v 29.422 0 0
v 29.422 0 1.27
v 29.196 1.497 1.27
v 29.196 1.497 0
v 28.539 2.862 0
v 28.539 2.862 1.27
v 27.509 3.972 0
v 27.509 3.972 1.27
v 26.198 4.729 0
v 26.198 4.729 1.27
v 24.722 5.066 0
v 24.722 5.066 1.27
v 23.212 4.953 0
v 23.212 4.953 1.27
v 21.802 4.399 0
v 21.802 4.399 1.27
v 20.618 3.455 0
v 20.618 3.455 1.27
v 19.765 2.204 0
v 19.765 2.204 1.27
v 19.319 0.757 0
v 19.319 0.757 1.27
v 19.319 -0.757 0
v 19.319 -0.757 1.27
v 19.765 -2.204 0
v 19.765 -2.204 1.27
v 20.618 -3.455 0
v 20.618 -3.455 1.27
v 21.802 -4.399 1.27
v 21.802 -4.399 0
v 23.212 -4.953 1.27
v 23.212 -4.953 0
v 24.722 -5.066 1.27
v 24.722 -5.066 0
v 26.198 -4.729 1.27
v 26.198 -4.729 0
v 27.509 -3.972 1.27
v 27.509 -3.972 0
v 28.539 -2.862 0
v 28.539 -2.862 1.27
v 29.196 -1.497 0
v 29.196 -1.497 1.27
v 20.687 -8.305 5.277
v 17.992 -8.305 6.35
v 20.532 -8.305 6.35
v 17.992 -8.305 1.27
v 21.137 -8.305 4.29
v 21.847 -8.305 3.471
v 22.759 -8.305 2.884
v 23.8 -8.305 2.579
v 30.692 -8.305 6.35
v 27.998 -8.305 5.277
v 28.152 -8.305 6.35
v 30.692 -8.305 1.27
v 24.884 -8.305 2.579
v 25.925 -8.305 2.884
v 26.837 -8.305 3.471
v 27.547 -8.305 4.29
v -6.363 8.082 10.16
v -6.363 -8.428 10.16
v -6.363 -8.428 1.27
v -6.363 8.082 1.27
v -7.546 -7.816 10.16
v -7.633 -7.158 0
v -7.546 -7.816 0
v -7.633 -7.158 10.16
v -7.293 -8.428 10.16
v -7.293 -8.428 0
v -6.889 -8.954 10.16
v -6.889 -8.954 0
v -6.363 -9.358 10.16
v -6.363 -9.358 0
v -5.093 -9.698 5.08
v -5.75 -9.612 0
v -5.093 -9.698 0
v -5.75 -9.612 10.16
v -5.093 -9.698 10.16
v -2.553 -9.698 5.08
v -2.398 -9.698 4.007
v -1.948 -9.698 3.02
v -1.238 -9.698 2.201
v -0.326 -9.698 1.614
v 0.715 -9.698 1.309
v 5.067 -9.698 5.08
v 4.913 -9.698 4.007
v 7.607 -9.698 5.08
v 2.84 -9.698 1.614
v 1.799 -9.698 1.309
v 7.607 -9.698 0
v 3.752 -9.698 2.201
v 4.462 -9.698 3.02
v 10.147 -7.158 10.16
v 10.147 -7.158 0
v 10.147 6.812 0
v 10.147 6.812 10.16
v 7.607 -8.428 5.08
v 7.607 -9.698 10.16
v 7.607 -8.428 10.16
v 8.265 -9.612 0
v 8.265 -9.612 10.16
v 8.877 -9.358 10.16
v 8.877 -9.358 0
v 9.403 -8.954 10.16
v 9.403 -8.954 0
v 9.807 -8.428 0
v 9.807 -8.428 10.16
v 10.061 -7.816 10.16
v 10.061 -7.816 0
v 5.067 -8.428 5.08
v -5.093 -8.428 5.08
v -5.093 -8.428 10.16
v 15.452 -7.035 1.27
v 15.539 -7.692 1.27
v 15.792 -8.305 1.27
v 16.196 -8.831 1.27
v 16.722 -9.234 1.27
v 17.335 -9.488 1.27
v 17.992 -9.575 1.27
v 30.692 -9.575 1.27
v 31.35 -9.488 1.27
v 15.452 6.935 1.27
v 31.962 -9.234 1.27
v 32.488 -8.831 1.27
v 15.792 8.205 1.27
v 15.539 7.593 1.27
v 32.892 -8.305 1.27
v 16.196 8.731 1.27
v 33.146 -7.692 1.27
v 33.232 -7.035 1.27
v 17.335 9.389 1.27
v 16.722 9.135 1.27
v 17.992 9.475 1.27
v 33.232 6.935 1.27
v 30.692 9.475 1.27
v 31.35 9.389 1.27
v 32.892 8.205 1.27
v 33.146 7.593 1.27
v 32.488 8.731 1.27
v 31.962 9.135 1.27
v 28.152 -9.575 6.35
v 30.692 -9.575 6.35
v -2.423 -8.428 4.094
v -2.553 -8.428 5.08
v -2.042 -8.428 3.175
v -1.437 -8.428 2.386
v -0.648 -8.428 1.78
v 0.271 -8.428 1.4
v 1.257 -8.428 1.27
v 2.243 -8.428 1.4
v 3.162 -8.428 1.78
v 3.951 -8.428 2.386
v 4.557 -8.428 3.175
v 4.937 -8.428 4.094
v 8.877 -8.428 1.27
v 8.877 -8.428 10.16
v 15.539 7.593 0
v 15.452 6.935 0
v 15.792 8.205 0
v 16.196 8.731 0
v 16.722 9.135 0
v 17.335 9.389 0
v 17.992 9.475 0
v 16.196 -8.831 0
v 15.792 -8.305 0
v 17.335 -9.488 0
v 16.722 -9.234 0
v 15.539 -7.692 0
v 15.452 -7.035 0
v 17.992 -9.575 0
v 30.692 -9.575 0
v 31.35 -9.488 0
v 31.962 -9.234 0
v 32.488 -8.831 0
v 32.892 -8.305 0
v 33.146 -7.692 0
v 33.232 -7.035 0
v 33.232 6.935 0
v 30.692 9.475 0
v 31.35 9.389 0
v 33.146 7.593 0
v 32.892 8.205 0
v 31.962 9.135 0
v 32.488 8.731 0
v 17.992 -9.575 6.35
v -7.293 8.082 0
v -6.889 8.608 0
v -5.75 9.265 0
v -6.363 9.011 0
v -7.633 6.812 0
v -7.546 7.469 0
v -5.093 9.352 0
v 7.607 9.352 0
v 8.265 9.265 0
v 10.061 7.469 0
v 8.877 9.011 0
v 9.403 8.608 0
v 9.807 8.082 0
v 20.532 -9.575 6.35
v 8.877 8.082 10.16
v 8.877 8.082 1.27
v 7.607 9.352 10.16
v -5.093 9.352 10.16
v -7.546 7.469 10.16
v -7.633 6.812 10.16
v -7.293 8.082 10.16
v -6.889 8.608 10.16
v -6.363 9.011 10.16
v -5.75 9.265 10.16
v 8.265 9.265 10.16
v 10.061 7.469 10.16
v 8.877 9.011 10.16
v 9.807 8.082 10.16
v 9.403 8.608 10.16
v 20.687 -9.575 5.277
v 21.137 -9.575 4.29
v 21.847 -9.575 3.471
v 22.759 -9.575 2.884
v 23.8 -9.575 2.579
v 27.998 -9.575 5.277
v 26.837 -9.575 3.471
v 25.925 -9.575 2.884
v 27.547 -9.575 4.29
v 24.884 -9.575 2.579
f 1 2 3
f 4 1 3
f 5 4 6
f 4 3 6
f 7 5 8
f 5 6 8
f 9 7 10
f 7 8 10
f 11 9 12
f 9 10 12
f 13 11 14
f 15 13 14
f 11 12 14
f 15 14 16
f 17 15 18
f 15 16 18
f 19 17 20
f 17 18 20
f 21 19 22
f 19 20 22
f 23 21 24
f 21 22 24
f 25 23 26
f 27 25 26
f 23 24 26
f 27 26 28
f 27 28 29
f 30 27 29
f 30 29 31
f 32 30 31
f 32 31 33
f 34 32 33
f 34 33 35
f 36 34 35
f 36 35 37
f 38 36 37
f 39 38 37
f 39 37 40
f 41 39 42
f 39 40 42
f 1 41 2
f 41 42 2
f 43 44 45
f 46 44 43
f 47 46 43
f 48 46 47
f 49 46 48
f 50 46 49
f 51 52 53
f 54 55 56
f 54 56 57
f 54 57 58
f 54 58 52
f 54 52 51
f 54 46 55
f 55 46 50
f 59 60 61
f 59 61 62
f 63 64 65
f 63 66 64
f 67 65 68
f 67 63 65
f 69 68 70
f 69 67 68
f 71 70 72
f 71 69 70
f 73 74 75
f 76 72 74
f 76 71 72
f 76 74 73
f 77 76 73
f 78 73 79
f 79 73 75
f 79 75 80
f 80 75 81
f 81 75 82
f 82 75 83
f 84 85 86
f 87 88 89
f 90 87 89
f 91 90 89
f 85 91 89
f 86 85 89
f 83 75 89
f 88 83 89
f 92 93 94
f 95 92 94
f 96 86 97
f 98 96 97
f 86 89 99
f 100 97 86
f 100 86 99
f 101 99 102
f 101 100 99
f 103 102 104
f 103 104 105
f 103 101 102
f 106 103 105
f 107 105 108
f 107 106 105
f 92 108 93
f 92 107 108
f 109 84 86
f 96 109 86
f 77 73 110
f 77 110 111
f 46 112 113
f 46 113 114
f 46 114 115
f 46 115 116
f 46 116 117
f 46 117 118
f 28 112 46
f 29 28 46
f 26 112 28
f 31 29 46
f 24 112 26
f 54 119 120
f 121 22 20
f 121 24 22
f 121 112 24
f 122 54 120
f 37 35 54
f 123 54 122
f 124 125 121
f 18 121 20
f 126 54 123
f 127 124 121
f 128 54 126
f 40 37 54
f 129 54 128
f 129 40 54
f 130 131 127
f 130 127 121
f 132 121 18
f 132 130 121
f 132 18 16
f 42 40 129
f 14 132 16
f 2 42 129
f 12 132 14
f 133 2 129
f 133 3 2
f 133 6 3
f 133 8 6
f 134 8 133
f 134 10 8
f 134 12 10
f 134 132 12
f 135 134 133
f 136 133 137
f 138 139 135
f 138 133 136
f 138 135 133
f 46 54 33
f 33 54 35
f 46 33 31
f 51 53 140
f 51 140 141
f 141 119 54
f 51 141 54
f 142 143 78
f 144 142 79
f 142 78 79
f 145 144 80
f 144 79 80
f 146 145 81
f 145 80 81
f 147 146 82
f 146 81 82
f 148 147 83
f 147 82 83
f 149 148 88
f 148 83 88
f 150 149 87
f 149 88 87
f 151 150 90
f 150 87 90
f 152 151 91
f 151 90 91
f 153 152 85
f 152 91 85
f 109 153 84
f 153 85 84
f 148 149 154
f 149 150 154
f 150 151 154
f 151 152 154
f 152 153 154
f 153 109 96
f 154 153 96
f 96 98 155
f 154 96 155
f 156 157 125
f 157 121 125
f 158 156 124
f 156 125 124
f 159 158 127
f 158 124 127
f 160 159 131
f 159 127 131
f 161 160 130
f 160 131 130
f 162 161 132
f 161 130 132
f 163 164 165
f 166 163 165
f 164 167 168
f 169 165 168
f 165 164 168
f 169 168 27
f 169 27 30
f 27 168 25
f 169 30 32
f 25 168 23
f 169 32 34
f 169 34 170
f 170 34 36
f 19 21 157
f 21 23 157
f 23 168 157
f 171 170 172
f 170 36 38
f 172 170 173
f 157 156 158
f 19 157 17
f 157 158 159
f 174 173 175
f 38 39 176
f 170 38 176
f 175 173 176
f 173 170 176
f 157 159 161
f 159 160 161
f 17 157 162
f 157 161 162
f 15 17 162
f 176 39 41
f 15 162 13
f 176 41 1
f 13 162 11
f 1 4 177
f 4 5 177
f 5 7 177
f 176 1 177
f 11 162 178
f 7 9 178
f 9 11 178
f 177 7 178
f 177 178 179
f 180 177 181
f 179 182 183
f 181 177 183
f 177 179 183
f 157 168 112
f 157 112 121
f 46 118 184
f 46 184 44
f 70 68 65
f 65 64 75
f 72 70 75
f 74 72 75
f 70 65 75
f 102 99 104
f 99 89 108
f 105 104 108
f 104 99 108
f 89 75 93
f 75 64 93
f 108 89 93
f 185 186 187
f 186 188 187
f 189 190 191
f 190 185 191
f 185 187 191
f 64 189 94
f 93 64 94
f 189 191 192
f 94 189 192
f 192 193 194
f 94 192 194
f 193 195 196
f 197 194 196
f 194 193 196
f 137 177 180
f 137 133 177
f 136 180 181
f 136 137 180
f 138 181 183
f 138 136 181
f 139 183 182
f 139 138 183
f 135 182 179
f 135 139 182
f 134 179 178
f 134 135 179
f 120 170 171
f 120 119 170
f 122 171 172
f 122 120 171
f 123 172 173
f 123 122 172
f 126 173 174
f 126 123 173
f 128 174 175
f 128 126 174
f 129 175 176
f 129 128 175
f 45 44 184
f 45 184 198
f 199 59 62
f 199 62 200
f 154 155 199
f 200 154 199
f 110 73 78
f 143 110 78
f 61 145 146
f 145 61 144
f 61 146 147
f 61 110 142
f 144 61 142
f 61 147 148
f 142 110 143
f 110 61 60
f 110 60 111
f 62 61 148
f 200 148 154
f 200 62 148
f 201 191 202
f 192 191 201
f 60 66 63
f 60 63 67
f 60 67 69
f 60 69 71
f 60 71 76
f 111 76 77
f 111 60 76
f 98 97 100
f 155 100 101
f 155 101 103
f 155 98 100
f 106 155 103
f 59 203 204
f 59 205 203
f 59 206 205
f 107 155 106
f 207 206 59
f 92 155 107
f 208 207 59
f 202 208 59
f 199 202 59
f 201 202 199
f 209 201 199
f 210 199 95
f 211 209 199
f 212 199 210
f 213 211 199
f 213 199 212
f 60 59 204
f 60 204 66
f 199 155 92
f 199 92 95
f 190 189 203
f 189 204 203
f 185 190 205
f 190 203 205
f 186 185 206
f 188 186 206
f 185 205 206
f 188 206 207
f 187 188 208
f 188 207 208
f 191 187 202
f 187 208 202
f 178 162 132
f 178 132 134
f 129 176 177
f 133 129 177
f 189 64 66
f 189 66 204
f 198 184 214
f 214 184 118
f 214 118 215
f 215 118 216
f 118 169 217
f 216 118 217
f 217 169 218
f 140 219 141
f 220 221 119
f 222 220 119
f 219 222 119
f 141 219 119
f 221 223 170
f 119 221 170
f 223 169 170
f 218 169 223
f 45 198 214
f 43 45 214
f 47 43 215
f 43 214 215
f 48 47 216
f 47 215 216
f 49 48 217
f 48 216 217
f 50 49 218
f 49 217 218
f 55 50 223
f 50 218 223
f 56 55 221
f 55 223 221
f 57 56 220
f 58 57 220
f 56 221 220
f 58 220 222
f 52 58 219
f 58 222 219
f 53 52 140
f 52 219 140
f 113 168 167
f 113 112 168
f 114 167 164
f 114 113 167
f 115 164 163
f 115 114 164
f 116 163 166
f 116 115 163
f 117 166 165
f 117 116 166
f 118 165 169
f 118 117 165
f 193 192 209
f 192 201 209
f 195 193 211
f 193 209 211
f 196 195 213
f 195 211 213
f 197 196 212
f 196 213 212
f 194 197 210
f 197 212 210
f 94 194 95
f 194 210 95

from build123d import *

# Parameters (mm, degrees)
F0_W      = 17.78
F0_H      = 19.05
F1_DEPTH  = 10.16
F2_W      = 15.24
F2_H      = 16.51
F3_DEPTH  = 8.89
F4_R      = 2.54
F5_W      = 2.54
F5_H      = 5.08
F6_DEPTH  = 1.27
F7_W      = 17.78
F7_H      = 19.05
F8_DEPTH  = 1.27
F9_R      = 2.54
F10_W     = 12.7
F10_H     = 1.27
F11_DEPTH = 5.08
F12_R     = 3.81
F13_DEPTH = 1.27
F14_R     = 5.08
F15_DEPTH = 1.27


# Not quite as in the source:
# - a feature names something its author has since deleted; it is built from what else it names


with BuildPart() as f1:
    # F0 (on Top) → F1 (new body)
    with BuildSketch(Plane.XY):
        with Locations((1.2571994369, -0.1732670812)):
            Rectangle(F0_W, F0_H)
    extrude(amount=F1_DEPTH)

    # F2 (on face) → F3 (cut)
    with BuildSketch(Plane.XY.offset(10.16)):
        with Locations((1.2571994369, -0.1732670812)):
            Rectangle(F2_W, F2_H)
    extrude(amount=-F3_DEPTH, mode=Mode.SUBTRACT)

    # F4
    f4_edges = [f1.edges().sort_by_distance(p)[0] for p in [
        (10.147199, 9.351733, 5.08),
        (-7.632801, 9.351733, 5.08),
        (-7.632801, -9.698267, 5.08),
        (10.147199, -9.698267, 5.08),
    ]]
    fillet(f4_edges, radius=F4_R)

    # F5 (on face) → F6 (cut)
    with BuildSketch(Plane.XZ.offset(9.6982670812)):
        with BuildLine():
            ThreePointArc((-2.5528005631, 5.08), (1.2571994369, 1.27), (5.0671994369, 5.08))
            ThreePointArc((5.0671994369, 5.08), (1.2571994369, 8.89), (-2.5528005631, 5.08))
        make_face()
        with Locations((-3.8228005631, 7.62)):
            Rectangle(F5_W, F5_H)
        with Locations((6.3371994369, 7.62)):
            Rectangle(F5_W, F5_H)
        with BuildLine():
            ThreePointArc((-2.5528005631, 5.08), (1.2571994369, 8.89), (5.0671994369, 5.08))
            Line((5.0671994369, 5.08), (5.0671994369, 10.16))
            Line((5.0671994369, 10.16), (-2.5528005631, 10.16))
            Line((-2.5528005631, 10.16), (-2.5528005631, 5.08))
        make_face()
    extrude(amount=-F6_DEPTH, mode=Mode.SUBTRACT)


with BuildPart() as f8:
    # F7 (on Top) → F8 (new body)
    with BuildSketch(Plane.XY):
        with Locations((24.3421698132, -0.0496563748)):
            Rectangle(F7_W, F7_H)
    extrude(amount=F8_DEPTH)

    # F9
    f9_edges = [f8.edges().sort_by_distance(p)[0] for p in [
        (15.45217, -9.574656, 0.635),
        (33.23217, -9.574656, 0.635),
        (33.23217, 9.475344, 0.635),
        (15.45217, 9.475344, 0.635),
    ]]
    fillet(f9_edges, radius=F9_R)

    # F10 (on face) → F11 (join)
    with BuildSketch(Plane.XY.offset(1.27)):
        with Locations((24.3421698132, -8.9396563748)):
            Rectangle(F10_W, F10_H)
    extrude(amount=F11_DEPTH)

    # F12 (on face) → F13 (cut)
    with BuildSketch(Plane.XZ.offset(9.5746563748)):
        with Locations((24.3421698132, 6.35)):
            Circle(F12_R)
    extrude(amount=-F13_DEPTH, mode=Mode.SUBTRACT)

    # F14 (on face) → F15 (cut)
    with BuildSketch(Plane.XY.offset(1.27)):
        with Locations((24.3421698132, 0)):
            Circle(F14_R)
    extrude(amount=-F15_DEPTH, mode=Mode.SUBTRACT)


solid = Compound([f1.part, f8.part])
